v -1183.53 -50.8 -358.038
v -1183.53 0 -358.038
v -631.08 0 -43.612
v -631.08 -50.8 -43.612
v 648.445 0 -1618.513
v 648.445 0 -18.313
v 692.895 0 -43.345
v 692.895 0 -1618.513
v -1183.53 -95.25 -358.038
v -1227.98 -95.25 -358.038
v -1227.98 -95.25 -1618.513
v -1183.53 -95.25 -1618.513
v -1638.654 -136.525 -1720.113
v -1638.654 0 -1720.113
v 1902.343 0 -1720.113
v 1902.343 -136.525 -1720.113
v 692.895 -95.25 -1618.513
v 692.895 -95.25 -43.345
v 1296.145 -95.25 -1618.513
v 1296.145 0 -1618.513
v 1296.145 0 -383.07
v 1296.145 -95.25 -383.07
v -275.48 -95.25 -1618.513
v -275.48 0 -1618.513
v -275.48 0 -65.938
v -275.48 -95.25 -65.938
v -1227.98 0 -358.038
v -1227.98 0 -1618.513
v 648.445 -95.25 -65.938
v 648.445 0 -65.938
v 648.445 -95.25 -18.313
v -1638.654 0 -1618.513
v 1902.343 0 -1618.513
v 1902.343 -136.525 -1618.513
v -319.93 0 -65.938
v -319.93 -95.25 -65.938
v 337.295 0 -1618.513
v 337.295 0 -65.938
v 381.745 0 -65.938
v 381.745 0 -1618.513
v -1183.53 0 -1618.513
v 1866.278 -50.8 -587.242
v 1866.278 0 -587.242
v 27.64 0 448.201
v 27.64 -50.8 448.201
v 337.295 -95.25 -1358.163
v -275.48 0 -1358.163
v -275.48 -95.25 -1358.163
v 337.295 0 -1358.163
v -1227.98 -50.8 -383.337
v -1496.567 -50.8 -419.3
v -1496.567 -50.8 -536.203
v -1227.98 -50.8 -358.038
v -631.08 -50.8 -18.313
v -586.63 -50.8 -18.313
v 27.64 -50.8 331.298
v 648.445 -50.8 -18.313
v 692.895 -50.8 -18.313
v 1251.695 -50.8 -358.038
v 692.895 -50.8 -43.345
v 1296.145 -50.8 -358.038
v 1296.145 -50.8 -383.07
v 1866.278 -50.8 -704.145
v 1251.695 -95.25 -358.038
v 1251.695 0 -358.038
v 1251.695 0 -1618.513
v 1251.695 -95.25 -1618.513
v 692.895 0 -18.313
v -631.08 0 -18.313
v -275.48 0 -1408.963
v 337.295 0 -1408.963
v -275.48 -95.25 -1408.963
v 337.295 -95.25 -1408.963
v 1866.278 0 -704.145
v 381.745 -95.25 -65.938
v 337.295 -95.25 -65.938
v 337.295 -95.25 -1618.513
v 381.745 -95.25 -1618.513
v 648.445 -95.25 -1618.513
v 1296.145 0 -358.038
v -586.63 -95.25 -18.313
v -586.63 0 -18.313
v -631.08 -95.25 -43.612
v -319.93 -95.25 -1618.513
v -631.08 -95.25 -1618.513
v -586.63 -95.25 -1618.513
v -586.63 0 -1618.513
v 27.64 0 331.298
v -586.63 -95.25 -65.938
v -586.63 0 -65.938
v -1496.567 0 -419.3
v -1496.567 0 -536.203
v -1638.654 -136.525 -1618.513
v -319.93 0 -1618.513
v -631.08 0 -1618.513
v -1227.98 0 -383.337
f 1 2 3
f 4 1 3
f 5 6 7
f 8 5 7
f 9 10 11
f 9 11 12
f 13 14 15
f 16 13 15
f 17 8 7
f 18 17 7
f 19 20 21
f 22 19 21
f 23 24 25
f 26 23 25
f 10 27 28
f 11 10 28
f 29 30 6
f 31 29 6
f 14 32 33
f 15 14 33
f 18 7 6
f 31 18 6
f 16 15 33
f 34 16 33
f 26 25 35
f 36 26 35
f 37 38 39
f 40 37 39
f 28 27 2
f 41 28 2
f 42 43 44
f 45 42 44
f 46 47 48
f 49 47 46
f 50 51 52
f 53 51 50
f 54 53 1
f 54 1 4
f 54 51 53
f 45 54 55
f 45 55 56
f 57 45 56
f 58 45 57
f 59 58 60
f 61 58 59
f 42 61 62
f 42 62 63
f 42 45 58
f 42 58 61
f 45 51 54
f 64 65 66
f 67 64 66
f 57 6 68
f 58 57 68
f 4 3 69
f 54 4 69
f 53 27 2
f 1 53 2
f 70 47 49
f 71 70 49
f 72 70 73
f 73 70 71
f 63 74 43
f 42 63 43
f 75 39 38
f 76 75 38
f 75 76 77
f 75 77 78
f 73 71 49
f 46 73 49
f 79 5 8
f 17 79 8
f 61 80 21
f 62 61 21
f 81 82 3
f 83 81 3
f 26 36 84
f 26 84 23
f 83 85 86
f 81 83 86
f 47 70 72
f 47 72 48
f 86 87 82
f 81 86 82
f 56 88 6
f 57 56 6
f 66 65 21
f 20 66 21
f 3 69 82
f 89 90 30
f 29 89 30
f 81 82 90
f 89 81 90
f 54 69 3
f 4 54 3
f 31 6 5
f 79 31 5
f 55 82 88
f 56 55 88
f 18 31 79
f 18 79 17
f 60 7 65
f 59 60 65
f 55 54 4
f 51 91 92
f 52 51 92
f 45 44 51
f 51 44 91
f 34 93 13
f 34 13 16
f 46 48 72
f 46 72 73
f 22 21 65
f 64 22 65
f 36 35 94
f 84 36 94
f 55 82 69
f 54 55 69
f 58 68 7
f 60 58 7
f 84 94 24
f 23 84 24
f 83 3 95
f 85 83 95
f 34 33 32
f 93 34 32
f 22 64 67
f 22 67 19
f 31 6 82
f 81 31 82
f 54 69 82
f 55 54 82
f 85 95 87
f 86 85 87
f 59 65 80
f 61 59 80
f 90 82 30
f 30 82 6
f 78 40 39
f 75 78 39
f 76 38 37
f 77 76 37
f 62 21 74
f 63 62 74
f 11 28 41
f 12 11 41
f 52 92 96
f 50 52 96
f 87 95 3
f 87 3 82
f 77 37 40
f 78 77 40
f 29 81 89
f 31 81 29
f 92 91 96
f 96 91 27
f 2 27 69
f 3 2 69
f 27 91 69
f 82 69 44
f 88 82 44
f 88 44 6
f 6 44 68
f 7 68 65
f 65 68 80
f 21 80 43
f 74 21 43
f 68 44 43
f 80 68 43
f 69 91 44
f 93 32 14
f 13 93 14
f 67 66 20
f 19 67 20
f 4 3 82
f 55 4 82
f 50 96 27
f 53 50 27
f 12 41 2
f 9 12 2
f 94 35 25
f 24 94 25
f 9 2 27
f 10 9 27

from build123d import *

# Parameters (mm, degrees)
F1_DEPTH = 50.8
F2_DEPTH = 95.25
F0_W     = 612.775
F0_H     = 50.8
F3_DEPTH = 95.25
F0_W_2   = 266.7
F0_H_2   = 1552.575
F4_DEPTH = 25.4
F0_H_3   = 1292.225
F5_DEPTH = 25.4
F6_DEPTH = 95.25
F7_DEPTH = 136.525
F8_DEPTH = 50.8


with BuildPart() as f1:
    # F0 (on Front) → F1 (new body)
    with BuildSketch(Plane.XZ):
        Polygon((-631.0804562256, -18.3131096094), (-586.6304562256, -18.3131096094), (27.6396495945, 331.2980676392), (27.6396495945, 448.2012418529), (-1496.5673157797, -419.299530993), (-1496.5673157797, -536.2027052067), (-1227.9804562256, -383.3367798222), (-1227.9804562256, -358.0381096094), (-1183.5304562256, -358.0381096094), (-631.0804562256, -43.6117798222), align=None)
        Polygon((27.6396495945, 331.2980676392), (648.4445437744, -18.3131096094), (692.8945437744, -18.3131096094), (692.8945437744, -43.3454780305), (1251.6945437744, -358.0381096094), (1296.1445437744, -358.0381096094), (1296.1445437744, -383.0704780305), (1866.2775707549, -704.1453932248), (1866.2775707549, -587.2422190111), (27.6396495945, 448.2012418529), align=None)
    extrude(amount=F1_DEPTH)

    # F0 (on Front) → F4 (cut)
    with BuildSketch(Plane.XZ):
        with Locations((-453.2804562256, -842.2256096094)):
            Rectangle(F0_W_2, F0_H_2)
    extrude(amount=-F4_DEPTH, mode=Mode.SUBTRACT)

    # F0 (on Front) → F5 (cut)
    with BuildSketch(Plane.XZ):
        with Locations((30.9070437744, -712.0506096094)):
            Rectangle(F0_W, F0_H_3)
    extrude(amount=-F5_DEPTH, mode=Mode.SUBTRACT)


with BuildPart() as f2:
    # F0 (on Front) → F2 (new body)
    with BuildSketch(Plane.XZ):
        Polygon((648.4445437744, -18.3131096094), (-586.6304562256, -18.3131096094), (-586.6304562256, -65.9381096094), (-319.9304562256, -65.9381096094), (-275.4804562256, -65.9381096094), (337.2945437744, -65.9381096094), (381.7445437744, -65.9381096094), (648.4445437744, -65.9381096094), align=None)
    extrude(amount=F2_DEPTH)


with BuildPart() as f3:
    # F0 (on Front) → F3 (new body)
    with BuildSketch(Plane.XZ):
        with Locations((30.9070437744, -1383.5631096094)):
            Rectangle(F0_W, F0_H)
    extrude(amount=F3_DEPTH)


with BuildPart() as f6:
    # F0 (on Front) → F6 (new body)
    with BuildSketch(Plane.XZ):
        Polygon((-1183.5304562256, -1618.5131096094), (-1183.5304562256, -358.0381096094), (-1227.9804562256, -383.3367798222), (-1227.9804562256, -1618.5131096094), align=None)
        Polygon((-1227.9804562256, -383.3367798222), (-1183.5304562256, -358.0381096094), (-1227.9804562256, -358.0381096094), align=None)
    extrude(amount=F6_DEPTH)


with BuildPart() as f6b:
    # F0 (on Front) → F6, piece 2 (new body)
    with BuildSketch(Plane.XZ):
        Polygon((-586.6304562256, -65.9381096094), (-586.6304562256, -18.3131096094), (-631.0804562256, -43.6117798222), (-631.0804562256, -1618.5131096094), (-586.6304562256, -1618.5131096094), align=None)
    extrude(amount=F6_DEPTH)


with BuildPart() as f6c:
    # F0 (on Front) → F6, piece 3 (new body)
    with BuildSketch(Plane.XZ):
        Polygon((-275.4804562256, -65.9381096094), (-319.9304562256, -65.9381096094), (-319.9304562256, -1618.5131096094), (-275.4804562256, -1618.5131096094), (-275.4804562256, -1408.9631096094), (-275.4804562256, -1358.1631096094), align=None)
    extrude(amount=F6_DEPTH)


with BuildPart() as f6d:
    # F0 (on Front) → F6, piece 4 (new body)
    with BuildSketch(Plane.XZ):
        Polygon((381.7445437744, -1618.5131096094), (381.7445437744, -65.9381096094), (337.2945437744, -65.9381096094), (337.2945437744, -1358.1631096094), (337.2945437744, -1408.9631096094), (337.2945437744, -1618.5131096094), align=None)
    extrude(amount=F6_DEPTH)


with BuildPart() as f6e:
    # F0 (on Front) → F6, piece 5 (new body)
    with BuildSketch(Plane.XZ):
        Polygon((692.8945437744, -43.3454780305), (648.4445437744, -18.3131096094), (648.4445437744, -65.9381096094), (648.4445437744, -1618.5131096094), (692.8945437744, -1618.5131096094), align=None)
    extrude(amount=F6_DEPTH)


with BuildPart() as f6f:
    # F0 (on Front) → F6, piece 6 (new body)
    with BuildSketch(Plane.XZ):
        Polygon((1296.1445437744, -383.0704780305), (1251.6945437744, -358.0381096094), (1251.6945437744, -1618.5131096094), (1296.1445437744, -1618.5131096094), align=None)
    extrude(amount=F6_DEPTH)


with BuildPart() as f7:
    # F0 (on Front) → F7 (new body)
    with BuildSketch(Plane.XZ):
        Polygon((-319.9304562256, -1618.5131096094), (-586.6304562256, -1618.5131096094), (-631.0804562256, -1618.5131096094), (-1183.5304562256, -1618.5131096094), (-1227.9804562256, -1618.5131096094), (-1638.6544704437, -1618.5131096094), (-1638.6544704437, -1720.1131096094), (1902.3425579071, -1720.1131096094), (1902.3425579071, -1618.5131096094), (1296.1445437744, -1618.5131096094), (1251.6945437744, -1618.5131096094), (692.8945437744, -1618.5131096094), (648.4445437744, -1618.5131096094), (381.7445437744, -1618.5131096094), (337.2945437744, -1618.5131096094), (-275.4804562256, -1618.5131096094), align=None)
    extrude(amount=F7_DEPTH)


with BuildPart() as f8:
    # F0 (on Front) → F8 (new body)
    with BuildSketch(Plane.XZ):
        Polygon((-631.0804562256, -43.6117798222), (-586.6304562256, -18.3131096094), (-631.0804562256, -18.3131096094), align=None)
    extrude(amount=F8_DEPTH)


solid = Compound([f1.part, f2.part, f3.part, f6.part, f6b.part, f6c.part, f6d.part, f6e.part, f6f.part, f7.part, f8.part])
